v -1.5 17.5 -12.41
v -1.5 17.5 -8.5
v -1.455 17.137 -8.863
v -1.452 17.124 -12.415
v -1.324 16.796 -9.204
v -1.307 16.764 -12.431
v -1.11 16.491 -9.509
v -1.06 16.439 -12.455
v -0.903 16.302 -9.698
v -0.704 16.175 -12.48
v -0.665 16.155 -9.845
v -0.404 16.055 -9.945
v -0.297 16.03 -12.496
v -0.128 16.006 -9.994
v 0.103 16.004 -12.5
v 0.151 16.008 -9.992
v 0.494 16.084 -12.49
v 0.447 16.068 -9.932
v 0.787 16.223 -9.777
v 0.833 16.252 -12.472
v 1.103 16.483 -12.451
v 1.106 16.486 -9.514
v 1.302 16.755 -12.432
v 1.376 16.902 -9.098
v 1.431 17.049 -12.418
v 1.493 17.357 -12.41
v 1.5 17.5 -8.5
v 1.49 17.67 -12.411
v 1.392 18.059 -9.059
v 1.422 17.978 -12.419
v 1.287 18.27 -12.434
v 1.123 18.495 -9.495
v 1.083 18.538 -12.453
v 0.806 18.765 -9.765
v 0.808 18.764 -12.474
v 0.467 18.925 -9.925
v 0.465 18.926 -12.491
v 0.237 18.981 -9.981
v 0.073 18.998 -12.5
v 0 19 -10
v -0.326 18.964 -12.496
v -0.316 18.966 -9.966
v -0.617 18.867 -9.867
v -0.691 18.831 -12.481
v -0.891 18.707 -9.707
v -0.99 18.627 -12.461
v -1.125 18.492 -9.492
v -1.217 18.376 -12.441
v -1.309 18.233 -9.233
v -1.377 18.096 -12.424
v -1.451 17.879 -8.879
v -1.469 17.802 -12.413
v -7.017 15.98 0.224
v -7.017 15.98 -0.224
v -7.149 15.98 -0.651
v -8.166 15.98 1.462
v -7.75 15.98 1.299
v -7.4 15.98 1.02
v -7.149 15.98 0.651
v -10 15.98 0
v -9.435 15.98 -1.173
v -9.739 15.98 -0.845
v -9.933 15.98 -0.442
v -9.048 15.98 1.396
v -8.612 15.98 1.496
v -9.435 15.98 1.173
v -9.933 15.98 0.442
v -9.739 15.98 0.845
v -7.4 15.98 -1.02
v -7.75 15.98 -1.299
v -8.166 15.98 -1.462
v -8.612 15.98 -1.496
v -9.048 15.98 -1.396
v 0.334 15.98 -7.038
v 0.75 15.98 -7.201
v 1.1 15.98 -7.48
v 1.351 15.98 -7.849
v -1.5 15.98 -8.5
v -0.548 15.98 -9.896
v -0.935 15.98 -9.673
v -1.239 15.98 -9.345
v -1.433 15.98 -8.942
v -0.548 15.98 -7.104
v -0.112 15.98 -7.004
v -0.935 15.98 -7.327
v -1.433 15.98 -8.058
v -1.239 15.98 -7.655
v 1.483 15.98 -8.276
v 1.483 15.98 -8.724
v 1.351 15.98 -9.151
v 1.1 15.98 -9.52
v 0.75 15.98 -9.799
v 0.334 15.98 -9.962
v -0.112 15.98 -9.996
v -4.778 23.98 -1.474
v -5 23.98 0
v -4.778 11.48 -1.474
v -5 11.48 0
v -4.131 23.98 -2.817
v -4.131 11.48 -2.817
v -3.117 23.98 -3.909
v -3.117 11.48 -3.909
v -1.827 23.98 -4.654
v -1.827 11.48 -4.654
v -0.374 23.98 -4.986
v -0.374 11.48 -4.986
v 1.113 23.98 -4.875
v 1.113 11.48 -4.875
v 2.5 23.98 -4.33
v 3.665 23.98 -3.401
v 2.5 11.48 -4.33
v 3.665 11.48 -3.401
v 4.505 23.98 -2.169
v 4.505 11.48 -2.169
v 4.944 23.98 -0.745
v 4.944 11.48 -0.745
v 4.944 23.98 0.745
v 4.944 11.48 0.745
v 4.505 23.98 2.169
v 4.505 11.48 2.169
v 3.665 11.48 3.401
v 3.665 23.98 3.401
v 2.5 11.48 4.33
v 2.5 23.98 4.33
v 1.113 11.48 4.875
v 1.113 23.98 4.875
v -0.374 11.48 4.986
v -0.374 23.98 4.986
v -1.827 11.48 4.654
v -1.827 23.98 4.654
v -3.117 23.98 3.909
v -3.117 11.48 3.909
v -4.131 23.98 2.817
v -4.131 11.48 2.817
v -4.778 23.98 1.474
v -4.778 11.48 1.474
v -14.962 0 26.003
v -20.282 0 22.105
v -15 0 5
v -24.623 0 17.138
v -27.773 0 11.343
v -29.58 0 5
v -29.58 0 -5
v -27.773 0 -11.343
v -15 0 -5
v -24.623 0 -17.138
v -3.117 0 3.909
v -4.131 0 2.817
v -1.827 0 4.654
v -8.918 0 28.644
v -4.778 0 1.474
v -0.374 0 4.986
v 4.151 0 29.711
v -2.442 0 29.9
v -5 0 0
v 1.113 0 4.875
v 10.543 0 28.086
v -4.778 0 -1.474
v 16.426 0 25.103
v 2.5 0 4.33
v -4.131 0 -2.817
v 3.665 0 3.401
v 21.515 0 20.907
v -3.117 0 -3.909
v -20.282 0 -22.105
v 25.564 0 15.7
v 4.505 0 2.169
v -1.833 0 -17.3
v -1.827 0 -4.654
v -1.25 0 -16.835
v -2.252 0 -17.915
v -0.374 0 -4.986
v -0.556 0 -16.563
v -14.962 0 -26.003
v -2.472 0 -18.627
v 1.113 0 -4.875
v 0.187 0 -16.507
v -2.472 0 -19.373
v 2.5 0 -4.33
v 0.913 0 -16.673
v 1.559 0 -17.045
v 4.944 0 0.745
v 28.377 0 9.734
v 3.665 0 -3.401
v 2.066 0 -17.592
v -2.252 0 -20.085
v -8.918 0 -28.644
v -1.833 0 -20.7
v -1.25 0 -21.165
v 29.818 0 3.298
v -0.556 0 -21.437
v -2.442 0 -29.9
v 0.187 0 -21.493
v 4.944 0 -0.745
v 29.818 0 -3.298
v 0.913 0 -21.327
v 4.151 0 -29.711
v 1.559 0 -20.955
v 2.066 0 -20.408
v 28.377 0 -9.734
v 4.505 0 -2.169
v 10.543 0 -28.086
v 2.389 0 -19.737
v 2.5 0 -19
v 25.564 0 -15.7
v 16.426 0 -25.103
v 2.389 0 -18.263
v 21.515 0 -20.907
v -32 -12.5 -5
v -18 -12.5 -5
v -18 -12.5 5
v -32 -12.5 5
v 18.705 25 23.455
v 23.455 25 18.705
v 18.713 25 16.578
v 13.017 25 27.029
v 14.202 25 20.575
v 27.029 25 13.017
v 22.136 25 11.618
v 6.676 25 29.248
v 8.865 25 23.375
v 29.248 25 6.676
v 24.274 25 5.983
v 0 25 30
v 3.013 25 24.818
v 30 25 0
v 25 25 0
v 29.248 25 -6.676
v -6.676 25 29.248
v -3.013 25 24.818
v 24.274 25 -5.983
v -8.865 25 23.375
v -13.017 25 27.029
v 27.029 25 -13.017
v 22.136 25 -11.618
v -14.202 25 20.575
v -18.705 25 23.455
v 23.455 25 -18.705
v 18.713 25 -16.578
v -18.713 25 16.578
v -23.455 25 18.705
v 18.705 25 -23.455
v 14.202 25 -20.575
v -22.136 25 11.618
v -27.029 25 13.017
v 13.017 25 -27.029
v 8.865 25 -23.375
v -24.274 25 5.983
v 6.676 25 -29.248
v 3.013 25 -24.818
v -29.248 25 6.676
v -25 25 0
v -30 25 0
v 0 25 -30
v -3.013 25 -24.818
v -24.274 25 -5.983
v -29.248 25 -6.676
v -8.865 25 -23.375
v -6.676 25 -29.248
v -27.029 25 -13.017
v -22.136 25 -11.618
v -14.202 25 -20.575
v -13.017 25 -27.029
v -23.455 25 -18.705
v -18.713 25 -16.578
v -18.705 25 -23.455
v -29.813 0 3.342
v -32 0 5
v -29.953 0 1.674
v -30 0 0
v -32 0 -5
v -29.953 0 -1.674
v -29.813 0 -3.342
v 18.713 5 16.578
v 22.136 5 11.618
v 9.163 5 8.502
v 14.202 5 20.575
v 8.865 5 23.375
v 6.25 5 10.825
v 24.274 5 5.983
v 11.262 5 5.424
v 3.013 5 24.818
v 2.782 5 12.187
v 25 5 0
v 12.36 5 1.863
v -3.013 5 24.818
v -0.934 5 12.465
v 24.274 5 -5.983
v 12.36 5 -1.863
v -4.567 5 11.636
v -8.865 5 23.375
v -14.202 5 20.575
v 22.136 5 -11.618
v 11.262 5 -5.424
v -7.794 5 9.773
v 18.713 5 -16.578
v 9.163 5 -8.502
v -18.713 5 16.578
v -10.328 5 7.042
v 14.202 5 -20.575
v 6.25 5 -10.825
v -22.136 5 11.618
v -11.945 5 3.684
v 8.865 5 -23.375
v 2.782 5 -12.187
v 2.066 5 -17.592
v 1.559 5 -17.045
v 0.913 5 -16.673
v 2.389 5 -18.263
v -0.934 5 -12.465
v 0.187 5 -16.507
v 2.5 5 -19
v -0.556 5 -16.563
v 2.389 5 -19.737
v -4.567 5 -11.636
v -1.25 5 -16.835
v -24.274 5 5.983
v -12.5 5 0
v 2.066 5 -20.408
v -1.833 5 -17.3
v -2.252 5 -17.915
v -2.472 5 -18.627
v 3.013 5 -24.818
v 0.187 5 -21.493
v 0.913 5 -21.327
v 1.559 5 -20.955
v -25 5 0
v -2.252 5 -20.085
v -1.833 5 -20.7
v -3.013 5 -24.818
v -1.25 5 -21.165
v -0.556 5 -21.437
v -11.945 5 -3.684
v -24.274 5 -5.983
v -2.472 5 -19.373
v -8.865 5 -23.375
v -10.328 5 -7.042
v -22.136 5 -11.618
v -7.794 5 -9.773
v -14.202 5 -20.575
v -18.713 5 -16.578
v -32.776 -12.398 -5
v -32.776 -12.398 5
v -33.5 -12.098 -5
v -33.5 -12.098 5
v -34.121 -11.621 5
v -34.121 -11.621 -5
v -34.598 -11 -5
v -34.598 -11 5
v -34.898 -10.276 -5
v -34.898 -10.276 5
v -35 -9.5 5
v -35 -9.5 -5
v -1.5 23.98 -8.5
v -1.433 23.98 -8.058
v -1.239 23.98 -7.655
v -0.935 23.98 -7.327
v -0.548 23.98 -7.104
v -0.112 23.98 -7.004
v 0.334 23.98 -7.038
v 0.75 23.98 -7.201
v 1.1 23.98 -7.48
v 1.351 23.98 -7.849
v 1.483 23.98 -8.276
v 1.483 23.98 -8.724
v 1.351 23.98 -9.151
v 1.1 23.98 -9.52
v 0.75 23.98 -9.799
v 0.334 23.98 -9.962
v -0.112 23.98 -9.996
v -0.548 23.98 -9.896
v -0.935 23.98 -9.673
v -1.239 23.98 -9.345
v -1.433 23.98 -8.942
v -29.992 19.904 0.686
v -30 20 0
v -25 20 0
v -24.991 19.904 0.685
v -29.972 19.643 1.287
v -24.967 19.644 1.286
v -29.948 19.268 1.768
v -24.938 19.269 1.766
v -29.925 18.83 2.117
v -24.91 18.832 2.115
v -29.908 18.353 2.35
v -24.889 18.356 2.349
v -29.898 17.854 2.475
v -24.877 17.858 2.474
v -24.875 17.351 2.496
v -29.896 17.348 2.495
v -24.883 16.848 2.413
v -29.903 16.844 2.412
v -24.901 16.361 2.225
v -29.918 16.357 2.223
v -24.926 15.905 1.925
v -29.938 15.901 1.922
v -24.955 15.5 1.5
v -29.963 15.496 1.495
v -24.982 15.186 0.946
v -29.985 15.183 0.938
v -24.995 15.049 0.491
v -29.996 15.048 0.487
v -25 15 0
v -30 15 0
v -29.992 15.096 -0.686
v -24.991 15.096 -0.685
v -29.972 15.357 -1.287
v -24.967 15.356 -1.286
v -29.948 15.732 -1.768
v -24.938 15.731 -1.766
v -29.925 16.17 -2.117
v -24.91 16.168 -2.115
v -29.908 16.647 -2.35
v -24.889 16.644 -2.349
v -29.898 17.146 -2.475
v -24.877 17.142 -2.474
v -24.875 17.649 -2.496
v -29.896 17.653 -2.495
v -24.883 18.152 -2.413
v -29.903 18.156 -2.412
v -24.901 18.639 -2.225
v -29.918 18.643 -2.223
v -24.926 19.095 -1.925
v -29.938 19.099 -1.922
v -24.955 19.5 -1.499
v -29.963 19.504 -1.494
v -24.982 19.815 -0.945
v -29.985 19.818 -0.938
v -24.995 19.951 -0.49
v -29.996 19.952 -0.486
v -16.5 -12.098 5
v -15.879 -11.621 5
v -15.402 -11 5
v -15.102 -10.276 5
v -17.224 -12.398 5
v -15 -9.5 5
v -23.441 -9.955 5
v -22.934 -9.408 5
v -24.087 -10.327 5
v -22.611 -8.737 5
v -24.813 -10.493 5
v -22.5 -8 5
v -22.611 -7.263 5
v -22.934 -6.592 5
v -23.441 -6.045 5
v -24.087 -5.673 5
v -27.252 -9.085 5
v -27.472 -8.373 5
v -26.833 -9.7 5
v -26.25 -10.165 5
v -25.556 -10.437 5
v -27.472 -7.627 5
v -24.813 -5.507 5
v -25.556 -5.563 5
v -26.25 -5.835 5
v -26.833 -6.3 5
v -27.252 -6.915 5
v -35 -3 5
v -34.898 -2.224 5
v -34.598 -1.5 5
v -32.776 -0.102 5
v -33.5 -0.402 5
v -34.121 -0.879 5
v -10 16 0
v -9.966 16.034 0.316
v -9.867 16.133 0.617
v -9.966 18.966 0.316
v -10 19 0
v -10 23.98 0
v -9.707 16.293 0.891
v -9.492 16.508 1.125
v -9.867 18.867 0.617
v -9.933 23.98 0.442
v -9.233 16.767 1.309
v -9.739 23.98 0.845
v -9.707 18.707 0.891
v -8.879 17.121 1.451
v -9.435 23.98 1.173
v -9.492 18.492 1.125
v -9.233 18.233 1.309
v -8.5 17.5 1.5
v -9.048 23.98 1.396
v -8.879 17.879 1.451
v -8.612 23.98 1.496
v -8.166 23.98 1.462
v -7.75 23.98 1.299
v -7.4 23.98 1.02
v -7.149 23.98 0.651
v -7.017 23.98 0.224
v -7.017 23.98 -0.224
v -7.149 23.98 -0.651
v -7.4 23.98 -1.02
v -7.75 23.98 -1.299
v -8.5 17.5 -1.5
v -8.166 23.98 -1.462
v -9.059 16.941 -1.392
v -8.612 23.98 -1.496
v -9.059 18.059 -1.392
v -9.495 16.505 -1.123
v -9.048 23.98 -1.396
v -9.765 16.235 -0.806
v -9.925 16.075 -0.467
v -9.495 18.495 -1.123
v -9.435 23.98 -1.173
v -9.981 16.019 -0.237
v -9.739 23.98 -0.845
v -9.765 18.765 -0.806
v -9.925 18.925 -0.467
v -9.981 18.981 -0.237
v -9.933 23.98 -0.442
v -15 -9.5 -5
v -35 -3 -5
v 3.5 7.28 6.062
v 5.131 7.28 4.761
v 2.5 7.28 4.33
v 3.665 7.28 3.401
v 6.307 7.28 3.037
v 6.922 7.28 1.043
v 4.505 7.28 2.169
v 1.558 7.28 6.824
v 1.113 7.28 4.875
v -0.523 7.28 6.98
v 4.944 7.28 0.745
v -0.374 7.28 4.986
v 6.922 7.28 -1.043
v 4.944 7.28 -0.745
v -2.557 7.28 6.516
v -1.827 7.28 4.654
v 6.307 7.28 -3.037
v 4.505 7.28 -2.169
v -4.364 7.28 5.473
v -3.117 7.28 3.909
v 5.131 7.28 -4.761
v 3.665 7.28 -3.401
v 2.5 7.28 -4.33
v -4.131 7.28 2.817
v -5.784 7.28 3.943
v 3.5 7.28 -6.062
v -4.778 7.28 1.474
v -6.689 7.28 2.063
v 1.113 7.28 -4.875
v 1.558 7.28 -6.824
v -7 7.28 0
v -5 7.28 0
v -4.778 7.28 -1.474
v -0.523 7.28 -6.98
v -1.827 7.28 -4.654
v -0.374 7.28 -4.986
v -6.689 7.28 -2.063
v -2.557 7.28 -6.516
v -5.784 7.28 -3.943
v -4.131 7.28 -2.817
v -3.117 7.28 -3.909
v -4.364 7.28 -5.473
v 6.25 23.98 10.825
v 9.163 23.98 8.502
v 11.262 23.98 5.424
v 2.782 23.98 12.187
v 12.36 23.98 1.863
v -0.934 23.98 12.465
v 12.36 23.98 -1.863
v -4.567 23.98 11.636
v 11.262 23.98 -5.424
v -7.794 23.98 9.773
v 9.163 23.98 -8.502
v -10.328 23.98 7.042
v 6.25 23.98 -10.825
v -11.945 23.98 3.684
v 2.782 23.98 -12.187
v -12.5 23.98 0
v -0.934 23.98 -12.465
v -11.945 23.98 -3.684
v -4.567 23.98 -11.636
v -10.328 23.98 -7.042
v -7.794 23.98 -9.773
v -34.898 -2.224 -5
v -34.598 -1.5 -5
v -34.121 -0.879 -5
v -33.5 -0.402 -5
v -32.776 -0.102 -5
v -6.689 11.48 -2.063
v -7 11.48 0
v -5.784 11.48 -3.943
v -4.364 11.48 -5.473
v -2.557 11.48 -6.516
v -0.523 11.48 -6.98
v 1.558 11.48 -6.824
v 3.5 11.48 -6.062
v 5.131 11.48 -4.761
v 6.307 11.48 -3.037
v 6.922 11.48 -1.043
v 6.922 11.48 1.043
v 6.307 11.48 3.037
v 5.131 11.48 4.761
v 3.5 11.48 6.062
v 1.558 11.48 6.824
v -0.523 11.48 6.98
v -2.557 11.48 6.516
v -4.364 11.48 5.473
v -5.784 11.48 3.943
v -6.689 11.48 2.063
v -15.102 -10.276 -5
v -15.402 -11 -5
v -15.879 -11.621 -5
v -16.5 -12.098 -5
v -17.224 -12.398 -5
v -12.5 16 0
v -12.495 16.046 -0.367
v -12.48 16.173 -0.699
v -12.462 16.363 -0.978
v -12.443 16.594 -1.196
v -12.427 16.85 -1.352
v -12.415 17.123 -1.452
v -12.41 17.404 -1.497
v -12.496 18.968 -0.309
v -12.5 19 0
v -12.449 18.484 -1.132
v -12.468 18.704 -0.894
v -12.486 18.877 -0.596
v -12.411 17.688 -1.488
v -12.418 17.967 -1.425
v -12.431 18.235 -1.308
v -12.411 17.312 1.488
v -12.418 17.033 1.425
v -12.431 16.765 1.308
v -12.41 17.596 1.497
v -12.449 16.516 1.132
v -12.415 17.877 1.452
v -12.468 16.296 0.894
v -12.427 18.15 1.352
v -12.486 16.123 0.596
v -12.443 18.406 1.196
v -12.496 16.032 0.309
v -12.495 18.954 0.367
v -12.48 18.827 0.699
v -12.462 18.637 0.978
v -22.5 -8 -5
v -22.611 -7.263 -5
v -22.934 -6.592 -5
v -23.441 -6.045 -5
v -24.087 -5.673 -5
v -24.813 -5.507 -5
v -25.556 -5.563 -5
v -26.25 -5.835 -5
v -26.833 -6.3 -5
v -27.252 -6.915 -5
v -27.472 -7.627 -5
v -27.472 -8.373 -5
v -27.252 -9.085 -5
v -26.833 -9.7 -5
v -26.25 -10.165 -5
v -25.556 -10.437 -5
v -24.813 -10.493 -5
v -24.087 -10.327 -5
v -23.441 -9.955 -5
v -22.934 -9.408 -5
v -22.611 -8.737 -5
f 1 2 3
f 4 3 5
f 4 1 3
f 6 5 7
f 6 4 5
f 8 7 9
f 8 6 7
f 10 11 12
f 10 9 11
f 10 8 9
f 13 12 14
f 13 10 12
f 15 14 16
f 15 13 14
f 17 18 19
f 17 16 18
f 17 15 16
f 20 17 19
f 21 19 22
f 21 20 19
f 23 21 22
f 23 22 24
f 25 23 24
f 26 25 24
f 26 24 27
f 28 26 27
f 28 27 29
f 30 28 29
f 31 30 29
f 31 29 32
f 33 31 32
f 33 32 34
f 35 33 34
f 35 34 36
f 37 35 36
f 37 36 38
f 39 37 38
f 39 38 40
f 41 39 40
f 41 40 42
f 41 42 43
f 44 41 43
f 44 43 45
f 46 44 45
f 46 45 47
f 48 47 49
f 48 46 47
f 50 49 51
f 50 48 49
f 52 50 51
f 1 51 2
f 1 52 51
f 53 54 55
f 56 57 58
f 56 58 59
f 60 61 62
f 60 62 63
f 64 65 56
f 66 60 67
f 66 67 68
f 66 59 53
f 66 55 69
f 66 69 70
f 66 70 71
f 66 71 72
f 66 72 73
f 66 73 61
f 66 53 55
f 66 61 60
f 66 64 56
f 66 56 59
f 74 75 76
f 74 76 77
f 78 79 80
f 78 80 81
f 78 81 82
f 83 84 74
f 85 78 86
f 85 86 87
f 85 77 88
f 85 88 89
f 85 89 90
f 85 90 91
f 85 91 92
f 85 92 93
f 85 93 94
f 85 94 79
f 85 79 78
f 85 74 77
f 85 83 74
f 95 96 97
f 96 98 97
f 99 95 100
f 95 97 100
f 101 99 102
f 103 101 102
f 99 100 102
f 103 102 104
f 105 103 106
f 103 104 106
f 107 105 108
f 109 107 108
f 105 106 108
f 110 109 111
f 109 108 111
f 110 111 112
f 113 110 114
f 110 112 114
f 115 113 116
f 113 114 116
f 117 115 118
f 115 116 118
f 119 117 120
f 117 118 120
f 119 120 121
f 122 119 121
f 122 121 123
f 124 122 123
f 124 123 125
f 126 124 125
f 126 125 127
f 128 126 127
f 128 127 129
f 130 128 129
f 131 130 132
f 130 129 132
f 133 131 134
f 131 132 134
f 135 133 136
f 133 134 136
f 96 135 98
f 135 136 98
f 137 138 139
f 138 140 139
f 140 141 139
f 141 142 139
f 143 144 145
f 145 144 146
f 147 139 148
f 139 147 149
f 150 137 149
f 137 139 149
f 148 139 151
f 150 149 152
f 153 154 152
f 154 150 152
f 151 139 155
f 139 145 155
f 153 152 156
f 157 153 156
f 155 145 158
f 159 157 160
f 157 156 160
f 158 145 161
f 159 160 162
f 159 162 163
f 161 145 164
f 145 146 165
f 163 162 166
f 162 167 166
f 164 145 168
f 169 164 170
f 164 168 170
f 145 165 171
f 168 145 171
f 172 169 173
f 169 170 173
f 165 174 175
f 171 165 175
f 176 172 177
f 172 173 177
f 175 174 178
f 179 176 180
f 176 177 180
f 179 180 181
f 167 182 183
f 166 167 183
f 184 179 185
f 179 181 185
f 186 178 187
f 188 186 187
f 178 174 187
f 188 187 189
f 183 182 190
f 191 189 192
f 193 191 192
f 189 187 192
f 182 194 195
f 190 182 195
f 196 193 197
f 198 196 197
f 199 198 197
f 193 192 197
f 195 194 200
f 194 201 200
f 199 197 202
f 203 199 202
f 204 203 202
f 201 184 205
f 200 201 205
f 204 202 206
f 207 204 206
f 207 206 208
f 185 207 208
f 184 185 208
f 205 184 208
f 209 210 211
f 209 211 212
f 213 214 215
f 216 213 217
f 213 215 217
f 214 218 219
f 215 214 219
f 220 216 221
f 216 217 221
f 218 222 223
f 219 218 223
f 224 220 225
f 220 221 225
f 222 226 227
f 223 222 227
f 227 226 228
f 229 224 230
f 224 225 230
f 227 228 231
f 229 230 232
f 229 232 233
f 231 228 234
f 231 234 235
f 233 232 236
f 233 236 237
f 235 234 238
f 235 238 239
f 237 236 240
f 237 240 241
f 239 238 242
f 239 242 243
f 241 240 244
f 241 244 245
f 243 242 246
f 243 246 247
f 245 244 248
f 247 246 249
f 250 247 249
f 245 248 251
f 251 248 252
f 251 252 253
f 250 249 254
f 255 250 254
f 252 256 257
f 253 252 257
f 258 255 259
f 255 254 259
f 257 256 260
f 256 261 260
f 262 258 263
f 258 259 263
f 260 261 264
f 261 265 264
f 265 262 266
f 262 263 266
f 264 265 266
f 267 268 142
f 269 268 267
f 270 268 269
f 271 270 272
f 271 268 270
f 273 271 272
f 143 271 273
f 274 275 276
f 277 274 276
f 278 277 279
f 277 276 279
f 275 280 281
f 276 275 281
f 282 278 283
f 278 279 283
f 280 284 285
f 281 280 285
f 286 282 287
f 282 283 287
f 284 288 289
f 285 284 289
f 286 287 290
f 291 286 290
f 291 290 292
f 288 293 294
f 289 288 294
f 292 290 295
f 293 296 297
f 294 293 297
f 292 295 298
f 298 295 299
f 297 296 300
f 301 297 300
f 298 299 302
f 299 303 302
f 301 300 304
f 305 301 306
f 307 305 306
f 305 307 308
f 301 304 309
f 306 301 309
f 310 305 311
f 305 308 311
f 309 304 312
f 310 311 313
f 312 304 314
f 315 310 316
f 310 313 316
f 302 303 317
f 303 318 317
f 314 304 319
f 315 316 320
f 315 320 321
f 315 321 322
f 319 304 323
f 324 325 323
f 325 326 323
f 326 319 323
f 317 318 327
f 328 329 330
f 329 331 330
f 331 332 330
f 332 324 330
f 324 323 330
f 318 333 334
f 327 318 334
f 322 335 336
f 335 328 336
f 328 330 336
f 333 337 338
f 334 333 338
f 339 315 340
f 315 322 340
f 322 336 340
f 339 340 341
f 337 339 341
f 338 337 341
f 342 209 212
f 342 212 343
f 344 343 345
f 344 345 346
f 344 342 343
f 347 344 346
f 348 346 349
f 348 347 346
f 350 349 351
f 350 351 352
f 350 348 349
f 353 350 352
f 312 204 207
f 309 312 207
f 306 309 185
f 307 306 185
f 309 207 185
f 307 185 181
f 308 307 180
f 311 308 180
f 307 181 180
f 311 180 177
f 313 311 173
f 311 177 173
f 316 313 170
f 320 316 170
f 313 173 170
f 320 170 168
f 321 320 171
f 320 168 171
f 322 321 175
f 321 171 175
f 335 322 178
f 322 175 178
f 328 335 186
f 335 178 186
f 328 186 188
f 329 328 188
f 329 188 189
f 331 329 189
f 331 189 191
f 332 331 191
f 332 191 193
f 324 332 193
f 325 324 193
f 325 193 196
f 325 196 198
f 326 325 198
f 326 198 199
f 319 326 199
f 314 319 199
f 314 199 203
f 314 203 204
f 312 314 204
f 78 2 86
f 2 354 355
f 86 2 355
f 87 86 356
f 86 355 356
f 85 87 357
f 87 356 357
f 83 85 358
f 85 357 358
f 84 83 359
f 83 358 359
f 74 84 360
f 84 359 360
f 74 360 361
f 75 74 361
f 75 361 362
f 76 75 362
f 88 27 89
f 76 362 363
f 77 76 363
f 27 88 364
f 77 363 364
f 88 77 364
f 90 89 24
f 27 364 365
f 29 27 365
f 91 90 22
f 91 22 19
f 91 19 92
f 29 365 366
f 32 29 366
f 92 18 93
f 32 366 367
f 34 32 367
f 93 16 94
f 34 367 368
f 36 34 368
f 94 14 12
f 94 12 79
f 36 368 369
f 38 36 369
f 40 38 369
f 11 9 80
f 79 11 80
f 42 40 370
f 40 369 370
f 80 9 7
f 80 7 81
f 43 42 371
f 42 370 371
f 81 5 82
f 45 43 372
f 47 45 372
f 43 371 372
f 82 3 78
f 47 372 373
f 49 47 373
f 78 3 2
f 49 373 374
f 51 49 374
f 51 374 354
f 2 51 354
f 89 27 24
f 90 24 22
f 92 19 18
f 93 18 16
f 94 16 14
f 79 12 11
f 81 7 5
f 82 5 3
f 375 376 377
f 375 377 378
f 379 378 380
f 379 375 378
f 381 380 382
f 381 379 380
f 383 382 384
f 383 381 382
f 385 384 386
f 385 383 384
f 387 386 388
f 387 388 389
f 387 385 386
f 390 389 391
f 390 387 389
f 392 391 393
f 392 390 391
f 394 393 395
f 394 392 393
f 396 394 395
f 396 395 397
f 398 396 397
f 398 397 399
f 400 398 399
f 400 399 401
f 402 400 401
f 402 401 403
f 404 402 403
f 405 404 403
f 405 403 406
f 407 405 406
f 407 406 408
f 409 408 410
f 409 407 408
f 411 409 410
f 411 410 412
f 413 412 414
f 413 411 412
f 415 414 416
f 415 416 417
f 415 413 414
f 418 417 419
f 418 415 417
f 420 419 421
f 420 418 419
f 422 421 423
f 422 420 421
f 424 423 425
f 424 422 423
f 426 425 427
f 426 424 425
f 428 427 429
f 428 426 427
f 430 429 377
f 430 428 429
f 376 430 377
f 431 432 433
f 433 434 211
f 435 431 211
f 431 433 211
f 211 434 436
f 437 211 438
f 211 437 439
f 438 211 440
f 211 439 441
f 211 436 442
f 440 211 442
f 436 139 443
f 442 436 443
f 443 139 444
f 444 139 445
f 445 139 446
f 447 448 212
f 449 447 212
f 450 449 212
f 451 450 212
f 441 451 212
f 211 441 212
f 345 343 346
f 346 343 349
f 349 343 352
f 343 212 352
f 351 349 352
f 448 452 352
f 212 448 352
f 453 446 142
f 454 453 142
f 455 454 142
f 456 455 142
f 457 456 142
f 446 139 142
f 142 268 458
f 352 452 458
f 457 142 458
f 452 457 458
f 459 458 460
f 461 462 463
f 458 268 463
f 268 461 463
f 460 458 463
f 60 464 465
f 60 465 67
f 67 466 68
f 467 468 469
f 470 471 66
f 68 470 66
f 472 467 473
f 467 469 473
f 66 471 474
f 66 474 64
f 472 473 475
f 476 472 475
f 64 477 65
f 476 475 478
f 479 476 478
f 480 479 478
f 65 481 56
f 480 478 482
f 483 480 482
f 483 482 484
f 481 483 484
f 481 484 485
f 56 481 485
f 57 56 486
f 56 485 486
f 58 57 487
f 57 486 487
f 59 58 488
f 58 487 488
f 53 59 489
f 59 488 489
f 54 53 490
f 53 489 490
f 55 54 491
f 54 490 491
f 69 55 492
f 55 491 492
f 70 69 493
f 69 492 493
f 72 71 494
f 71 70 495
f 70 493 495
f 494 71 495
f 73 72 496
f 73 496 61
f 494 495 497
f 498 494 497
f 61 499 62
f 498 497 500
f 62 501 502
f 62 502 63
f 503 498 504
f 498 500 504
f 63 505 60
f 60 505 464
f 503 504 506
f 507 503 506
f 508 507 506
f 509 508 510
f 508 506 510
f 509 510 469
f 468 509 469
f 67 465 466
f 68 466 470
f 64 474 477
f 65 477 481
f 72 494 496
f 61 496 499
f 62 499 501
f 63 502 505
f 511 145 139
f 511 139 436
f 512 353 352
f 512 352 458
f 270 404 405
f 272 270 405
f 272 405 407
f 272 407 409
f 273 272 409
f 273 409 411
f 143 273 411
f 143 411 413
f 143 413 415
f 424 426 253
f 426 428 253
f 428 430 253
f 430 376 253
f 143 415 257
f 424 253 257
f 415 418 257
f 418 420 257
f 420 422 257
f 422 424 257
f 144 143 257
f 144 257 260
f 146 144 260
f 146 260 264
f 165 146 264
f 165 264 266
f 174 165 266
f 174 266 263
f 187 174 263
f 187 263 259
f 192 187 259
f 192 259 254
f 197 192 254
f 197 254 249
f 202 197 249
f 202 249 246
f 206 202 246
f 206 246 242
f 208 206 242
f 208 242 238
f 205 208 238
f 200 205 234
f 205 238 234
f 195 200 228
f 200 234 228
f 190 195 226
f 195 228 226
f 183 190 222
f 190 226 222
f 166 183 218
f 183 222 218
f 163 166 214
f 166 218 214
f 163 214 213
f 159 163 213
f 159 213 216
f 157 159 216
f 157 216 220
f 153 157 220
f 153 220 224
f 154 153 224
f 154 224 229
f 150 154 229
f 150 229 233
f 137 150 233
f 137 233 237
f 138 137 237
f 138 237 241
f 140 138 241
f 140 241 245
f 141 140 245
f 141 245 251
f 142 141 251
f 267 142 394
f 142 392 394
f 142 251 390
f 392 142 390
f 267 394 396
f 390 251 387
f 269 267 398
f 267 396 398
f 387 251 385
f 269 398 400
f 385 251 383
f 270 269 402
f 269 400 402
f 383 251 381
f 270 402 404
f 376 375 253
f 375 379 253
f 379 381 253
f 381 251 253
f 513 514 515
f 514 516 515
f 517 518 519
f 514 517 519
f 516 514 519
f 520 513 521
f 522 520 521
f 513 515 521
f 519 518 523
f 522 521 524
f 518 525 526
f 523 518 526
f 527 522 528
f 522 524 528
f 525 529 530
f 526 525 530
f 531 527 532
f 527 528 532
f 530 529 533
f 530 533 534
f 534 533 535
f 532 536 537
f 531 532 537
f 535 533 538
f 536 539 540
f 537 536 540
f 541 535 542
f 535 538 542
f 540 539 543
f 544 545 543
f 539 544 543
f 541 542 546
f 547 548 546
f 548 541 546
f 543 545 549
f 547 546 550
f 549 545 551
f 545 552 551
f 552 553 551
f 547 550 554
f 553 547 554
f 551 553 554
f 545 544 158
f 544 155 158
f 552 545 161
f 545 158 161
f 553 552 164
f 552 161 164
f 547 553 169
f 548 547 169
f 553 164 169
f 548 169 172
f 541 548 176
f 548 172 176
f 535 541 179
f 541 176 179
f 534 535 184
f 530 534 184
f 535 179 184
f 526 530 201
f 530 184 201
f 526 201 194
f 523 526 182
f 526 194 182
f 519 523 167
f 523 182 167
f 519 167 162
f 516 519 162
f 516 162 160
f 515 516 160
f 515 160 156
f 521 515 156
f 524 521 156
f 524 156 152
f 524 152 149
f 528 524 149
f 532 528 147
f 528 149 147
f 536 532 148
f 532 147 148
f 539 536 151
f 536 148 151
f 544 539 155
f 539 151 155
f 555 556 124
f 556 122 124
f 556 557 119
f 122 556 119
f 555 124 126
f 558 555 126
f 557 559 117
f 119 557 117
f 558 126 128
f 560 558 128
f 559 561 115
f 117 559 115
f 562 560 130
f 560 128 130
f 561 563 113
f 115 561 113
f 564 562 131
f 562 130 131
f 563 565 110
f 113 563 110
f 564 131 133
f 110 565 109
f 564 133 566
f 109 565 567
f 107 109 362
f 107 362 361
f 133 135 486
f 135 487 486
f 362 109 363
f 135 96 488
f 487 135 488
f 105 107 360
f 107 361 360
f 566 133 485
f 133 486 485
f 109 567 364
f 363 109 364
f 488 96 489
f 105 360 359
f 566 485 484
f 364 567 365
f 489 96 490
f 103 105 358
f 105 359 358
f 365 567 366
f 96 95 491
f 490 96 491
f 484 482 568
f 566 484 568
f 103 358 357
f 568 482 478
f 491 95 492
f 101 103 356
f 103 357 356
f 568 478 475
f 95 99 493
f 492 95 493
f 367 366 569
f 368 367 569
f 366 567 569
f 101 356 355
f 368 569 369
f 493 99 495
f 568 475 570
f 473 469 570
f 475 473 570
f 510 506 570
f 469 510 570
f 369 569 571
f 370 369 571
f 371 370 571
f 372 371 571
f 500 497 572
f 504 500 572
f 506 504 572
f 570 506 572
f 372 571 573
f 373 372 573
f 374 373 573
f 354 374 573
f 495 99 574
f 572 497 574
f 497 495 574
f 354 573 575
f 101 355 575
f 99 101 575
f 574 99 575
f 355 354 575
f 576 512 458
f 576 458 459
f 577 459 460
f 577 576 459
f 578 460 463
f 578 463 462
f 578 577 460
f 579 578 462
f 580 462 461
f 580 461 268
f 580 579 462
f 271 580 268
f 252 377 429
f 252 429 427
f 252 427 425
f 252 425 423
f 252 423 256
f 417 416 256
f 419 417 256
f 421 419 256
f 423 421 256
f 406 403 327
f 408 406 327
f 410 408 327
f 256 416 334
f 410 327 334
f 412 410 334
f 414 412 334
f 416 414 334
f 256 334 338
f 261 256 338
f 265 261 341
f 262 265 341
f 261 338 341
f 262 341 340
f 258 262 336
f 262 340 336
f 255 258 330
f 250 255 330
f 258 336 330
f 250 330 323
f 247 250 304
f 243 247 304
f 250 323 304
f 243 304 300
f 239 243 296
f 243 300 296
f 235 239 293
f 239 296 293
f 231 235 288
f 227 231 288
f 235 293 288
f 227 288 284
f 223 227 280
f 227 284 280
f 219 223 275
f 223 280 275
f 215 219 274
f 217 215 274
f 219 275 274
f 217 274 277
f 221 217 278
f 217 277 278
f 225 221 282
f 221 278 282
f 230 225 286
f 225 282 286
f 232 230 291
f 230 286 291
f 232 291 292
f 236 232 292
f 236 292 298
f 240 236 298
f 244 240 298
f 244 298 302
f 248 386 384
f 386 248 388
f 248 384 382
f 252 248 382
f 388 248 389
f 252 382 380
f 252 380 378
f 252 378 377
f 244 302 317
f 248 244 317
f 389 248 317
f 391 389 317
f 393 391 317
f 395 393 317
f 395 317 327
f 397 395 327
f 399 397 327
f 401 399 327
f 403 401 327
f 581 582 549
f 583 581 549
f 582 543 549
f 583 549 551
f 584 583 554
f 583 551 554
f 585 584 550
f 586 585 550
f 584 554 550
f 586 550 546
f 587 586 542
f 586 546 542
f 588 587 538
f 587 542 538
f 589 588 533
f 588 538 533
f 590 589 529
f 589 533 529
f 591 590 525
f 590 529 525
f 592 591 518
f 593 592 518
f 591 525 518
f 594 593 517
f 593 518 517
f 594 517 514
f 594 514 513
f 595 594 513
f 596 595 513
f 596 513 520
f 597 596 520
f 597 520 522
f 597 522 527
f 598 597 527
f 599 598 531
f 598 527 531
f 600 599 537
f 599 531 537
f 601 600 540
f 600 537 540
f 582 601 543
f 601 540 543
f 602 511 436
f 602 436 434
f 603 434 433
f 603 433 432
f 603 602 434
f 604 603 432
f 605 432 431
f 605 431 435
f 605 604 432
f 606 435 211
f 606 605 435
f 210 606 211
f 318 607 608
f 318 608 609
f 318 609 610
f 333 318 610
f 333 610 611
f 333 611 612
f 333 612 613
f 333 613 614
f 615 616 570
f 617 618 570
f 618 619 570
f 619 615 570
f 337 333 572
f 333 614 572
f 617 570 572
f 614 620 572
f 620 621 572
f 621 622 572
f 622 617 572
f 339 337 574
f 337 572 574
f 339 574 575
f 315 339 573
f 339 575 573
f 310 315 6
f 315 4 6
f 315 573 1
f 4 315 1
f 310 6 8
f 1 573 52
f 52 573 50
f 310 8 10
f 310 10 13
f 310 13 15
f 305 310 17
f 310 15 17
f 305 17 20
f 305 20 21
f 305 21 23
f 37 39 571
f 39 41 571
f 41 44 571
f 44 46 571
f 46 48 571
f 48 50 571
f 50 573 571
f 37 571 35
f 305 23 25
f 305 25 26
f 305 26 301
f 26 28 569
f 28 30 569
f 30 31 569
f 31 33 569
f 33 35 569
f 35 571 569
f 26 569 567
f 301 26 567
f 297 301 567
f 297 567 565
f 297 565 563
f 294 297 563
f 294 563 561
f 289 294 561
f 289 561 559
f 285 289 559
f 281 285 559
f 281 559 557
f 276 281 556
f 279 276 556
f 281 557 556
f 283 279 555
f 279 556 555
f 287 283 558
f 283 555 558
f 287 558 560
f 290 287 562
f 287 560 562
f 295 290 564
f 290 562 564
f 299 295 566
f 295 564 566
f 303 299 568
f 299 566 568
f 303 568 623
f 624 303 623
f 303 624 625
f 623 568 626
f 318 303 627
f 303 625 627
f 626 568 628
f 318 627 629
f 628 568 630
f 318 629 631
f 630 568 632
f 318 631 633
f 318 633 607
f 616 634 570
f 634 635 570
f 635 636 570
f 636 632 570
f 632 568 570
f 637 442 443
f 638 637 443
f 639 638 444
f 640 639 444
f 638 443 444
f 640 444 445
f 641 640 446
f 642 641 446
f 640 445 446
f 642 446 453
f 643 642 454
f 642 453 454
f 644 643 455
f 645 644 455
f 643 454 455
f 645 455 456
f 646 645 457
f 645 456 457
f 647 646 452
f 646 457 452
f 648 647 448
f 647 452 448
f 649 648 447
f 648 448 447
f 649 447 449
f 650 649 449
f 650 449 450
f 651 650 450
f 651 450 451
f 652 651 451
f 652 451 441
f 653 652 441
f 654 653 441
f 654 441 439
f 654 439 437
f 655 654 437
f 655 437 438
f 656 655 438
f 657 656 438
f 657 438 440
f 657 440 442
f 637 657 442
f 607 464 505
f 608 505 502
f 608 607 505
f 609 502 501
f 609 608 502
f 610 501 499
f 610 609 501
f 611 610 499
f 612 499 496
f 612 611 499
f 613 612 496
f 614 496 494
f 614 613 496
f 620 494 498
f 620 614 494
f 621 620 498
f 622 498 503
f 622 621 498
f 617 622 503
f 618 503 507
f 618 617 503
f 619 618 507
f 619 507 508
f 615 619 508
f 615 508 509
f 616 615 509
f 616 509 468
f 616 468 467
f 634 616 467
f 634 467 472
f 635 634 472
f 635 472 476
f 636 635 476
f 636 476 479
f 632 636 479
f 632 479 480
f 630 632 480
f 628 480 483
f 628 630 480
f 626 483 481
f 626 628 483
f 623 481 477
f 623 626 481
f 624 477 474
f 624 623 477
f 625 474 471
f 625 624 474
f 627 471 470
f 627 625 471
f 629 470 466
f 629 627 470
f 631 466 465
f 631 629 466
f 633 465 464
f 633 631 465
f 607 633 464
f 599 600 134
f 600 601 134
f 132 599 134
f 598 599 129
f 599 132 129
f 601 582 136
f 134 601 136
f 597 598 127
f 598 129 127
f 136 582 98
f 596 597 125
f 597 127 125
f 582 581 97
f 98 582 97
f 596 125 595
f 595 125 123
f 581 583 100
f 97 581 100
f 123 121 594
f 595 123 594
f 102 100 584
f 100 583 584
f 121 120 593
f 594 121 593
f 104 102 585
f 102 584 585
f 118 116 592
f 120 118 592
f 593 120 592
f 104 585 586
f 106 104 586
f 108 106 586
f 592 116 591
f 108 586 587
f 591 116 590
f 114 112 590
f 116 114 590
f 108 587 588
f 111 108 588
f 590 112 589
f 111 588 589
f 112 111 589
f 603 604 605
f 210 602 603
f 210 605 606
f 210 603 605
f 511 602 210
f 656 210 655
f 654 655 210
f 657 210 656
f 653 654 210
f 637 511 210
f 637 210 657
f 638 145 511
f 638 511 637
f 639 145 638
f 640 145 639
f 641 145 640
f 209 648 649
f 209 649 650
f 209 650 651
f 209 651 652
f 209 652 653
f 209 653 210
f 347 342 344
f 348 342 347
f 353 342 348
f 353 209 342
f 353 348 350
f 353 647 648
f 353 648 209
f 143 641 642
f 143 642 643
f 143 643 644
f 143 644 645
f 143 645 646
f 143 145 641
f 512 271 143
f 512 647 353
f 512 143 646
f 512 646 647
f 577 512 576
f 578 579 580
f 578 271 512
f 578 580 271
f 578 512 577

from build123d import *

# Parameters (mm, degrees)
SKETCH2_R                          = 2.5
CUT_EXTRUDE1_DEPTH                 = 10
SKETCH3_R                          = 1.5
CUT_EXTRUDE2_DEPTH                 = 8
SKETCH4_R                          = 1.5
CUT_EXTRUDE3_DEPTH                 = 4
SKETCH5_R                          = 1.5
CUT_EXTRUDE4_DEPTH                 = 4
CUT_EXTRUDE7_DEPTH                 = 10
CUT_EXTRUDE7_DEPTH_BACK            = 10
SKETCH6_R                          = 2.5
BOSS_EXTRUDE5_DEPTH                = 5
BOSS_EXTRUDE5_DEPTH_BACK           = 5
F_5_0_5_DIAMETER_HOLE1_D           = 5
F_5_0_5_DIAMETER_HOLE1_ON_FACE_2_D = 5


with BuildPart() as part:
    # Sketch1 → Revolve2 (revolve)
    with BuildSketch(Plane.XY):
        Polygon((5, 7.28), (5, 0), (30, 0), (30, 25), (25, 25), (25, 5), (12.5, 5), (12.5, 23.98), (5, 23.98), (5, 11.48), (7, 11.48), (7, 7.28), align=None)
    revolve(axis=Axis((0, 23.98, 0), (0, -1, 0)))

    # Sketch2 → Cut-Extrude1 (cut)
    with BuildSketch(Plane.XZ):
        with Locations((0, -19)):
            Circle(SKETCH2_R)
    extrude(amount=-CUT_EXTRUDE1_DEPTH, mode=Mode.SUBTRACT)

    # Sketch3 → Cut-Extrude2 (cut)
    with BuildSketch(Plane(origin=(0, 23.98, 0), x_dir=(1, 0, 0), z_dir=(0, 1, 0))):
        with Locations((-8.5, 0)):
            Circle(SKETCH3_R)
        with Locations((0, 8.5)):
            Circle(SKETCH3_R)
    extrude(amount=-CUT_EXTRUDE2_DEPTH, mode=Mode.SUBTRACT)

    # Sketch4 → Cut-Extrude3 (cut)
    with BuildSketch(Plane.XY.offset(-12.5)):
        with Locations((0, 17.5)):
            Circle(SKETCH4_R)
    extrude(amount=CUT_EXTRUDE3_DEPTH, mode=Mode.SUBTRACT)

    # Sketch5 → Cut-Extrude4 (cut)
    with BuildSketch(Plane(origin=(-12.5, 0, 0), x_dir=(0, 0, -1), z_dir=(1, 0, 0))):
        with Locations((0, 17.5)):
            Circle(SKETCH5_R)
    extrude(amount=CUT_EXTRUDE4_DEPTH, mode=Mode.SUBTRACT)

    # Sketch6 → Cut-Extrude7 (cut, two sides: drawn at the far end of the back side and taken through both)
    with BuildSketch(Plane(origin=(-30, 0, 0), x_dir=(0, 0, -1), z_dir=(1, 0, 0)).offset(-CUT_EXTRUDE7_DEPTH_BACK)):
        with Locations((0, 17.5)):
            Circle(SKETCH6_R)
    extrude(amount=CUT_EXTRUDE7_DEPTH + CUT_EXTRUDE7_DEPTH_BACK, mode=Mode.SUBTRACT)

    # Sketch7 → Boss-Extrude5 (add, two sides: drawn at the far end of the back side and taken through both)
    with BuildSketch(Plane.XY.offset(-BOSS_EXTRUDE5_DEPTH_BACK)):
        with BuildLine():
            Line((-32, 0), (-30, 0))
            Line((-30, 0), (-15, 0))
            Line((-15, 0), (-15, -9.5))
            ThreePointArc((-15, -9.5), (-15.878679656, -11.621320344), (-18, -12.5))
            Line((-18, -12.5), (-32, -12.5))
            ThreePointArc((-32, -12.5), (-34.121320344, -11.621320344), (-35, -9.5))
            Line((-35, -9.5), (-35, -3))
            ThreePointArc((-35, -3), (-34.121320344, -0.878679656), (-32, 0))
        make_face()
    extrude(amount=BOSS_EXTRUDE5_DEPTH + BOSS_EXTRUDE5_DEPTH_BACK)

    # Ø5.0 (5) Diameter Hole1 (through all)
    with Locations(Plane(origin=(-25, -8, -5), x_dir=(-1, 0, 0), z_dir=(0, 0, -1))):
        with Locations((0, 0)):
            Hole(F_5_0_5_DIAMETER_HOLE1_D / 2)

    # Ø5.0 (5) Diameter Hole1 on face 2 (through all)
    with Locations(Plane(origin=(-19.5551144, -17.55502899, 0), x_dir=(-1, 0, 0), z_dir=(0, 0, -1))):
        with Locations((0, 0)):
            Hole(F_5_0_5_DIAMETER_HOLE1_ON_FACE_2_D / 2)


solid = part.part
